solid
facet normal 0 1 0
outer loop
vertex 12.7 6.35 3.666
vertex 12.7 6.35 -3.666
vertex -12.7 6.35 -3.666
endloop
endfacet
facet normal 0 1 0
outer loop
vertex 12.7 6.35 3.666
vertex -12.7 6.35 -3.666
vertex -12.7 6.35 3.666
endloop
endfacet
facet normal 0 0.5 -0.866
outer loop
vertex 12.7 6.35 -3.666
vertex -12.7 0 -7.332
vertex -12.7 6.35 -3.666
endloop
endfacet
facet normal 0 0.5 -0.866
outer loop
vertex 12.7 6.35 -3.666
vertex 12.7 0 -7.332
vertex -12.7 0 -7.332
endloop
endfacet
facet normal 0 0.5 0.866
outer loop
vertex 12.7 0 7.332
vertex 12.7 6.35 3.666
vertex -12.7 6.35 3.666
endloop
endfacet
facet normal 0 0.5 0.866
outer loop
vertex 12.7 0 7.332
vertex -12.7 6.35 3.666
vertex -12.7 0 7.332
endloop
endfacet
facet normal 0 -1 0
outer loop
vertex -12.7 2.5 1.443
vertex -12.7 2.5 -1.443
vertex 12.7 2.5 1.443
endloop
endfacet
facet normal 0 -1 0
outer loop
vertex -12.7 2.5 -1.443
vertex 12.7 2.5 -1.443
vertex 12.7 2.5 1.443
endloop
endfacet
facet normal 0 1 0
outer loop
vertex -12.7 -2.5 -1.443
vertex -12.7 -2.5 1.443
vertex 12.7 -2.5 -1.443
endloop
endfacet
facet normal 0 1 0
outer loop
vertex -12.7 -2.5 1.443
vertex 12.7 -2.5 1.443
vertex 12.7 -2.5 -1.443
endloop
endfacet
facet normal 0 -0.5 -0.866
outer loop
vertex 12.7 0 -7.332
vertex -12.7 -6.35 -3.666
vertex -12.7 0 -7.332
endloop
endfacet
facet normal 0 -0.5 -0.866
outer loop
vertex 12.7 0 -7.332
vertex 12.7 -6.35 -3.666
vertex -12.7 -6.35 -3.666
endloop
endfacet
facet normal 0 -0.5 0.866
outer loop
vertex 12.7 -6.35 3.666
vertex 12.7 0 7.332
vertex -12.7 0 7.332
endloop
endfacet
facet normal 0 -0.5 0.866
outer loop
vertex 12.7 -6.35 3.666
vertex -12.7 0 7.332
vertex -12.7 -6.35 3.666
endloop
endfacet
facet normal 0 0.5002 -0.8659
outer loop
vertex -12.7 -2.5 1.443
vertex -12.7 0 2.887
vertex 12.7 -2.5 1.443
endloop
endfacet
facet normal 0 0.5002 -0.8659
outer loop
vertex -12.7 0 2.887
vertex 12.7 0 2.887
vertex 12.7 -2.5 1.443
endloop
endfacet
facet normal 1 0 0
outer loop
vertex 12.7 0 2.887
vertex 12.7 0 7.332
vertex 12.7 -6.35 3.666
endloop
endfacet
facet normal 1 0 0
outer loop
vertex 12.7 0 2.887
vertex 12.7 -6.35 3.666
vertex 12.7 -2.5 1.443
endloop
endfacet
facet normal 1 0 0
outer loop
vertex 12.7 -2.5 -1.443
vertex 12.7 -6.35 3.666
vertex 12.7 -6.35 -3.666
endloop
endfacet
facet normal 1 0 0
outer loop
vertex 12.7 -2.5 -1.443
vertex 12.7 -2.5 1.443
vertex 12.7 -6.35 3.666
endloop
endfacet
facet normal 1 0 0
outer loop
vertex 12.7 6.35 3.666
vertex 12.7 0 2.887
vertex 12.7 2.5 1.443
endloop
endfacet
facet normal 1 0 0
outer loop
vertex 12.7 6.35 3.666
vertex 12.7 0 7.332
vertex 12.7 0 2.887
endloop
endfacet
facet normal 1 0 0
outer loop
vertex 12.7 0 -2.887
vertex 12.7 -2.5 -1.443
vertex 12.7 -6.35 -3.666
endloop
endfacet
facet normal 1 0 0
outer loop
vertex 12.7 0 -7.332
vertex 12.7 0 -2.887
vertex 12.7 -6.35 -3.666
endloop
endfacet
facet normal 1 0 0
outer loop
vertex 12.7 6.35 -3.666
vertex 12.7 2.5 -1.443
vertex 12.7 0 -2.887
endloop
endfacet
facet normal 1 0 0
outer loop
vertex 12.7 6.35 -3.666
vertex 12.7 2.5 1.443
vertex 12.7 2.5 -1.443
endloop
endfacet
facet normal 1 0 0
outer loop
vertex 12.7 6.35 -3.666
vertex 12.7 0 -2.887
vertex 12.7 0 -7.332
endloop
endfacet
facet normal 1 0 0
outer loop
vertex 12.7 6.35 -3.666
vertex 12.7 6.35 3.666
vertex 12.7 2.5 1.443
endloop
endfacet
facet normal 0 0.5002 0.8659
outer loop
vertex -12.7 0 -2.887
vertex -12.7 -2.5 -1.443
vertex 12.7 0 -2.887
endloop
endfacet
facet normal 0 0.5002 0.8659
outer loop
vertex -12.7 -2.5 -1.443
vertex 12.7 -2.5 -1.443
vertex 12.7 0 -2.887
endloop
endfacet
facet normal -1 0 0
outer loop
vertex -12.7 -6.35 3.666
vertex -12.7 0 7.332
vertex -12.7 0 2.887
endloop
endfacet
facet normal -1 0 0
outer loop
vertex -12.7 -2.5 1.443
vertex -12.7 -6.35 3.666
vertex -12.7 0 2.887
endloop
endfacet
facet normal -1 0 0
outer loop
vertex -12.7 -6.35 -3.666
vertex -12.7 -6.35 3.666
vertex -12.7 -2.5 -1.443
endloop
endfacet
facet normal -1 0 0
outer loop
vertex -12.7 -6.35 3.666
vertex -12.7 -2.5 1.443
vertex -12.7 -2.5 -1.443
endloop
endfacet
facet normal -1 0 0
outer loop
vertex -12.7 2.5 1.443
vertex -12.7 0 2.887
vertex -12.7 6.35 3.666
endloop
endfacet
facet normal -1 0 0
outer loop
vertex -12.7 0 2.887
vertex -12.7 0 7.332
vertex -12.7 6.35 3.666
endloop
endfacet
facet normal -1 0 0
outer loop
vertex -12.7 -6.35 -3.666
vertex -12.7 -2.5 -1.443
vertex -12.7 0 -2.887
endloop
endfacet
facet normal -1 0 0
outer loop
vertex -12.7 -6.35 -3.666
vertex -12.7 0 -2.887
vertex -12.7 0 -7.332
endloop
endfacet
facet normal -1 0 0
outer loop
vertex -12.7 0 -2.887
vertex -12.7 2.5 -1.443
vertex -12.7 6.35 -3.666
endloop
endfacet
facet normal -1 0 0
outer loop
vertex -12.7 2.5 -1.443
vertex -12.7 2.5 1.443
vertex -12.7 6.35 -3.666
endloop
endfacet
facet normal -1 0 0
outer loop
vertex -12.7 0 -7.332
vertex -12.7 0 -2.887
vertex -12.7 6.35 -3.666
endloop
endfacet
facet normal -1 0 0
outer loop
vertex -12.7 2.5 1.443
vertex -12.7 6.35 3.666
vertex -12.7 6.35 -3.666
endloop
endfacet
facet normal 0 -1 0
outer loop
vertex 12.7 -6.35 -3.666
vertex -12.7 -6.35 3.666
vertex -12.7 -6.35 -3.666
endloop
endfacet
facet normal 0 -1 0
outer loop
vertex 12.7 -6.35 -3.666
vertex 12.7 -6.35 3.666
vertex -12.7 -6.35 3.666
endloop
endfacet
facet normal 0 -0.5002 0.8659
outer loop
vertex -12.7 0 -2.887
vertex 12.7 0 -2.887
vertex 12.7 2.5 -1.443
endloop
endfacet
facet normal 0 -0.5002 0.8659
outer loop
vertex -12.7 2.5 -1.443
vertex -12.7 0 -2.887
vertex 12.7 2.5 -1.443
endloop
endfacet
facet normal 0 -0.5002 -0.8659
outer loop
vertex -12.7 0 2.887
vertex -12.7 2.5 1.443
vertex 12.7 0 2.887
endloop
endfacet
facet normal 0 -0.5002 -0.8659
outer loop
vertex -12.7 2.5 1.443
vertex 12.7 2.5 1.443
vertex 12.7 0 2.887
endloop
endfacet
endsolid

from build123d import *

# Parameters (mm, degrees)
BOSS_EXTRUDE1_DEPTH = 12.7


with BuildPart() as part:
    # Sketch1 → Boss-Extrude1 (new, symmetric)
    with BuildSketch(Plane(origin=(0, 0, 0), x_dir=(0, 0, -1), z_dir=(1, 0, 0))):
        Polygon((7.332348419, 0), (3.666174209, 6.35), (-3.666174209, 6.35), (-7.332348419, 0), (-3.666174209, -6.35), (3.666174209, -6.35), align=None)
        Polygon((2.886751346, 0), (1.443375673, 2.5), (-1.443375673, 2.5), (-2.886751346, 0), (-1.443375673, -2.5), (1.443375673, -2.5), align=None, mode=Mode.SUBTRACT)
    extrude(amount=BOSS_EXTRUDE1_DEPTH, both=True)


solid = part.part
